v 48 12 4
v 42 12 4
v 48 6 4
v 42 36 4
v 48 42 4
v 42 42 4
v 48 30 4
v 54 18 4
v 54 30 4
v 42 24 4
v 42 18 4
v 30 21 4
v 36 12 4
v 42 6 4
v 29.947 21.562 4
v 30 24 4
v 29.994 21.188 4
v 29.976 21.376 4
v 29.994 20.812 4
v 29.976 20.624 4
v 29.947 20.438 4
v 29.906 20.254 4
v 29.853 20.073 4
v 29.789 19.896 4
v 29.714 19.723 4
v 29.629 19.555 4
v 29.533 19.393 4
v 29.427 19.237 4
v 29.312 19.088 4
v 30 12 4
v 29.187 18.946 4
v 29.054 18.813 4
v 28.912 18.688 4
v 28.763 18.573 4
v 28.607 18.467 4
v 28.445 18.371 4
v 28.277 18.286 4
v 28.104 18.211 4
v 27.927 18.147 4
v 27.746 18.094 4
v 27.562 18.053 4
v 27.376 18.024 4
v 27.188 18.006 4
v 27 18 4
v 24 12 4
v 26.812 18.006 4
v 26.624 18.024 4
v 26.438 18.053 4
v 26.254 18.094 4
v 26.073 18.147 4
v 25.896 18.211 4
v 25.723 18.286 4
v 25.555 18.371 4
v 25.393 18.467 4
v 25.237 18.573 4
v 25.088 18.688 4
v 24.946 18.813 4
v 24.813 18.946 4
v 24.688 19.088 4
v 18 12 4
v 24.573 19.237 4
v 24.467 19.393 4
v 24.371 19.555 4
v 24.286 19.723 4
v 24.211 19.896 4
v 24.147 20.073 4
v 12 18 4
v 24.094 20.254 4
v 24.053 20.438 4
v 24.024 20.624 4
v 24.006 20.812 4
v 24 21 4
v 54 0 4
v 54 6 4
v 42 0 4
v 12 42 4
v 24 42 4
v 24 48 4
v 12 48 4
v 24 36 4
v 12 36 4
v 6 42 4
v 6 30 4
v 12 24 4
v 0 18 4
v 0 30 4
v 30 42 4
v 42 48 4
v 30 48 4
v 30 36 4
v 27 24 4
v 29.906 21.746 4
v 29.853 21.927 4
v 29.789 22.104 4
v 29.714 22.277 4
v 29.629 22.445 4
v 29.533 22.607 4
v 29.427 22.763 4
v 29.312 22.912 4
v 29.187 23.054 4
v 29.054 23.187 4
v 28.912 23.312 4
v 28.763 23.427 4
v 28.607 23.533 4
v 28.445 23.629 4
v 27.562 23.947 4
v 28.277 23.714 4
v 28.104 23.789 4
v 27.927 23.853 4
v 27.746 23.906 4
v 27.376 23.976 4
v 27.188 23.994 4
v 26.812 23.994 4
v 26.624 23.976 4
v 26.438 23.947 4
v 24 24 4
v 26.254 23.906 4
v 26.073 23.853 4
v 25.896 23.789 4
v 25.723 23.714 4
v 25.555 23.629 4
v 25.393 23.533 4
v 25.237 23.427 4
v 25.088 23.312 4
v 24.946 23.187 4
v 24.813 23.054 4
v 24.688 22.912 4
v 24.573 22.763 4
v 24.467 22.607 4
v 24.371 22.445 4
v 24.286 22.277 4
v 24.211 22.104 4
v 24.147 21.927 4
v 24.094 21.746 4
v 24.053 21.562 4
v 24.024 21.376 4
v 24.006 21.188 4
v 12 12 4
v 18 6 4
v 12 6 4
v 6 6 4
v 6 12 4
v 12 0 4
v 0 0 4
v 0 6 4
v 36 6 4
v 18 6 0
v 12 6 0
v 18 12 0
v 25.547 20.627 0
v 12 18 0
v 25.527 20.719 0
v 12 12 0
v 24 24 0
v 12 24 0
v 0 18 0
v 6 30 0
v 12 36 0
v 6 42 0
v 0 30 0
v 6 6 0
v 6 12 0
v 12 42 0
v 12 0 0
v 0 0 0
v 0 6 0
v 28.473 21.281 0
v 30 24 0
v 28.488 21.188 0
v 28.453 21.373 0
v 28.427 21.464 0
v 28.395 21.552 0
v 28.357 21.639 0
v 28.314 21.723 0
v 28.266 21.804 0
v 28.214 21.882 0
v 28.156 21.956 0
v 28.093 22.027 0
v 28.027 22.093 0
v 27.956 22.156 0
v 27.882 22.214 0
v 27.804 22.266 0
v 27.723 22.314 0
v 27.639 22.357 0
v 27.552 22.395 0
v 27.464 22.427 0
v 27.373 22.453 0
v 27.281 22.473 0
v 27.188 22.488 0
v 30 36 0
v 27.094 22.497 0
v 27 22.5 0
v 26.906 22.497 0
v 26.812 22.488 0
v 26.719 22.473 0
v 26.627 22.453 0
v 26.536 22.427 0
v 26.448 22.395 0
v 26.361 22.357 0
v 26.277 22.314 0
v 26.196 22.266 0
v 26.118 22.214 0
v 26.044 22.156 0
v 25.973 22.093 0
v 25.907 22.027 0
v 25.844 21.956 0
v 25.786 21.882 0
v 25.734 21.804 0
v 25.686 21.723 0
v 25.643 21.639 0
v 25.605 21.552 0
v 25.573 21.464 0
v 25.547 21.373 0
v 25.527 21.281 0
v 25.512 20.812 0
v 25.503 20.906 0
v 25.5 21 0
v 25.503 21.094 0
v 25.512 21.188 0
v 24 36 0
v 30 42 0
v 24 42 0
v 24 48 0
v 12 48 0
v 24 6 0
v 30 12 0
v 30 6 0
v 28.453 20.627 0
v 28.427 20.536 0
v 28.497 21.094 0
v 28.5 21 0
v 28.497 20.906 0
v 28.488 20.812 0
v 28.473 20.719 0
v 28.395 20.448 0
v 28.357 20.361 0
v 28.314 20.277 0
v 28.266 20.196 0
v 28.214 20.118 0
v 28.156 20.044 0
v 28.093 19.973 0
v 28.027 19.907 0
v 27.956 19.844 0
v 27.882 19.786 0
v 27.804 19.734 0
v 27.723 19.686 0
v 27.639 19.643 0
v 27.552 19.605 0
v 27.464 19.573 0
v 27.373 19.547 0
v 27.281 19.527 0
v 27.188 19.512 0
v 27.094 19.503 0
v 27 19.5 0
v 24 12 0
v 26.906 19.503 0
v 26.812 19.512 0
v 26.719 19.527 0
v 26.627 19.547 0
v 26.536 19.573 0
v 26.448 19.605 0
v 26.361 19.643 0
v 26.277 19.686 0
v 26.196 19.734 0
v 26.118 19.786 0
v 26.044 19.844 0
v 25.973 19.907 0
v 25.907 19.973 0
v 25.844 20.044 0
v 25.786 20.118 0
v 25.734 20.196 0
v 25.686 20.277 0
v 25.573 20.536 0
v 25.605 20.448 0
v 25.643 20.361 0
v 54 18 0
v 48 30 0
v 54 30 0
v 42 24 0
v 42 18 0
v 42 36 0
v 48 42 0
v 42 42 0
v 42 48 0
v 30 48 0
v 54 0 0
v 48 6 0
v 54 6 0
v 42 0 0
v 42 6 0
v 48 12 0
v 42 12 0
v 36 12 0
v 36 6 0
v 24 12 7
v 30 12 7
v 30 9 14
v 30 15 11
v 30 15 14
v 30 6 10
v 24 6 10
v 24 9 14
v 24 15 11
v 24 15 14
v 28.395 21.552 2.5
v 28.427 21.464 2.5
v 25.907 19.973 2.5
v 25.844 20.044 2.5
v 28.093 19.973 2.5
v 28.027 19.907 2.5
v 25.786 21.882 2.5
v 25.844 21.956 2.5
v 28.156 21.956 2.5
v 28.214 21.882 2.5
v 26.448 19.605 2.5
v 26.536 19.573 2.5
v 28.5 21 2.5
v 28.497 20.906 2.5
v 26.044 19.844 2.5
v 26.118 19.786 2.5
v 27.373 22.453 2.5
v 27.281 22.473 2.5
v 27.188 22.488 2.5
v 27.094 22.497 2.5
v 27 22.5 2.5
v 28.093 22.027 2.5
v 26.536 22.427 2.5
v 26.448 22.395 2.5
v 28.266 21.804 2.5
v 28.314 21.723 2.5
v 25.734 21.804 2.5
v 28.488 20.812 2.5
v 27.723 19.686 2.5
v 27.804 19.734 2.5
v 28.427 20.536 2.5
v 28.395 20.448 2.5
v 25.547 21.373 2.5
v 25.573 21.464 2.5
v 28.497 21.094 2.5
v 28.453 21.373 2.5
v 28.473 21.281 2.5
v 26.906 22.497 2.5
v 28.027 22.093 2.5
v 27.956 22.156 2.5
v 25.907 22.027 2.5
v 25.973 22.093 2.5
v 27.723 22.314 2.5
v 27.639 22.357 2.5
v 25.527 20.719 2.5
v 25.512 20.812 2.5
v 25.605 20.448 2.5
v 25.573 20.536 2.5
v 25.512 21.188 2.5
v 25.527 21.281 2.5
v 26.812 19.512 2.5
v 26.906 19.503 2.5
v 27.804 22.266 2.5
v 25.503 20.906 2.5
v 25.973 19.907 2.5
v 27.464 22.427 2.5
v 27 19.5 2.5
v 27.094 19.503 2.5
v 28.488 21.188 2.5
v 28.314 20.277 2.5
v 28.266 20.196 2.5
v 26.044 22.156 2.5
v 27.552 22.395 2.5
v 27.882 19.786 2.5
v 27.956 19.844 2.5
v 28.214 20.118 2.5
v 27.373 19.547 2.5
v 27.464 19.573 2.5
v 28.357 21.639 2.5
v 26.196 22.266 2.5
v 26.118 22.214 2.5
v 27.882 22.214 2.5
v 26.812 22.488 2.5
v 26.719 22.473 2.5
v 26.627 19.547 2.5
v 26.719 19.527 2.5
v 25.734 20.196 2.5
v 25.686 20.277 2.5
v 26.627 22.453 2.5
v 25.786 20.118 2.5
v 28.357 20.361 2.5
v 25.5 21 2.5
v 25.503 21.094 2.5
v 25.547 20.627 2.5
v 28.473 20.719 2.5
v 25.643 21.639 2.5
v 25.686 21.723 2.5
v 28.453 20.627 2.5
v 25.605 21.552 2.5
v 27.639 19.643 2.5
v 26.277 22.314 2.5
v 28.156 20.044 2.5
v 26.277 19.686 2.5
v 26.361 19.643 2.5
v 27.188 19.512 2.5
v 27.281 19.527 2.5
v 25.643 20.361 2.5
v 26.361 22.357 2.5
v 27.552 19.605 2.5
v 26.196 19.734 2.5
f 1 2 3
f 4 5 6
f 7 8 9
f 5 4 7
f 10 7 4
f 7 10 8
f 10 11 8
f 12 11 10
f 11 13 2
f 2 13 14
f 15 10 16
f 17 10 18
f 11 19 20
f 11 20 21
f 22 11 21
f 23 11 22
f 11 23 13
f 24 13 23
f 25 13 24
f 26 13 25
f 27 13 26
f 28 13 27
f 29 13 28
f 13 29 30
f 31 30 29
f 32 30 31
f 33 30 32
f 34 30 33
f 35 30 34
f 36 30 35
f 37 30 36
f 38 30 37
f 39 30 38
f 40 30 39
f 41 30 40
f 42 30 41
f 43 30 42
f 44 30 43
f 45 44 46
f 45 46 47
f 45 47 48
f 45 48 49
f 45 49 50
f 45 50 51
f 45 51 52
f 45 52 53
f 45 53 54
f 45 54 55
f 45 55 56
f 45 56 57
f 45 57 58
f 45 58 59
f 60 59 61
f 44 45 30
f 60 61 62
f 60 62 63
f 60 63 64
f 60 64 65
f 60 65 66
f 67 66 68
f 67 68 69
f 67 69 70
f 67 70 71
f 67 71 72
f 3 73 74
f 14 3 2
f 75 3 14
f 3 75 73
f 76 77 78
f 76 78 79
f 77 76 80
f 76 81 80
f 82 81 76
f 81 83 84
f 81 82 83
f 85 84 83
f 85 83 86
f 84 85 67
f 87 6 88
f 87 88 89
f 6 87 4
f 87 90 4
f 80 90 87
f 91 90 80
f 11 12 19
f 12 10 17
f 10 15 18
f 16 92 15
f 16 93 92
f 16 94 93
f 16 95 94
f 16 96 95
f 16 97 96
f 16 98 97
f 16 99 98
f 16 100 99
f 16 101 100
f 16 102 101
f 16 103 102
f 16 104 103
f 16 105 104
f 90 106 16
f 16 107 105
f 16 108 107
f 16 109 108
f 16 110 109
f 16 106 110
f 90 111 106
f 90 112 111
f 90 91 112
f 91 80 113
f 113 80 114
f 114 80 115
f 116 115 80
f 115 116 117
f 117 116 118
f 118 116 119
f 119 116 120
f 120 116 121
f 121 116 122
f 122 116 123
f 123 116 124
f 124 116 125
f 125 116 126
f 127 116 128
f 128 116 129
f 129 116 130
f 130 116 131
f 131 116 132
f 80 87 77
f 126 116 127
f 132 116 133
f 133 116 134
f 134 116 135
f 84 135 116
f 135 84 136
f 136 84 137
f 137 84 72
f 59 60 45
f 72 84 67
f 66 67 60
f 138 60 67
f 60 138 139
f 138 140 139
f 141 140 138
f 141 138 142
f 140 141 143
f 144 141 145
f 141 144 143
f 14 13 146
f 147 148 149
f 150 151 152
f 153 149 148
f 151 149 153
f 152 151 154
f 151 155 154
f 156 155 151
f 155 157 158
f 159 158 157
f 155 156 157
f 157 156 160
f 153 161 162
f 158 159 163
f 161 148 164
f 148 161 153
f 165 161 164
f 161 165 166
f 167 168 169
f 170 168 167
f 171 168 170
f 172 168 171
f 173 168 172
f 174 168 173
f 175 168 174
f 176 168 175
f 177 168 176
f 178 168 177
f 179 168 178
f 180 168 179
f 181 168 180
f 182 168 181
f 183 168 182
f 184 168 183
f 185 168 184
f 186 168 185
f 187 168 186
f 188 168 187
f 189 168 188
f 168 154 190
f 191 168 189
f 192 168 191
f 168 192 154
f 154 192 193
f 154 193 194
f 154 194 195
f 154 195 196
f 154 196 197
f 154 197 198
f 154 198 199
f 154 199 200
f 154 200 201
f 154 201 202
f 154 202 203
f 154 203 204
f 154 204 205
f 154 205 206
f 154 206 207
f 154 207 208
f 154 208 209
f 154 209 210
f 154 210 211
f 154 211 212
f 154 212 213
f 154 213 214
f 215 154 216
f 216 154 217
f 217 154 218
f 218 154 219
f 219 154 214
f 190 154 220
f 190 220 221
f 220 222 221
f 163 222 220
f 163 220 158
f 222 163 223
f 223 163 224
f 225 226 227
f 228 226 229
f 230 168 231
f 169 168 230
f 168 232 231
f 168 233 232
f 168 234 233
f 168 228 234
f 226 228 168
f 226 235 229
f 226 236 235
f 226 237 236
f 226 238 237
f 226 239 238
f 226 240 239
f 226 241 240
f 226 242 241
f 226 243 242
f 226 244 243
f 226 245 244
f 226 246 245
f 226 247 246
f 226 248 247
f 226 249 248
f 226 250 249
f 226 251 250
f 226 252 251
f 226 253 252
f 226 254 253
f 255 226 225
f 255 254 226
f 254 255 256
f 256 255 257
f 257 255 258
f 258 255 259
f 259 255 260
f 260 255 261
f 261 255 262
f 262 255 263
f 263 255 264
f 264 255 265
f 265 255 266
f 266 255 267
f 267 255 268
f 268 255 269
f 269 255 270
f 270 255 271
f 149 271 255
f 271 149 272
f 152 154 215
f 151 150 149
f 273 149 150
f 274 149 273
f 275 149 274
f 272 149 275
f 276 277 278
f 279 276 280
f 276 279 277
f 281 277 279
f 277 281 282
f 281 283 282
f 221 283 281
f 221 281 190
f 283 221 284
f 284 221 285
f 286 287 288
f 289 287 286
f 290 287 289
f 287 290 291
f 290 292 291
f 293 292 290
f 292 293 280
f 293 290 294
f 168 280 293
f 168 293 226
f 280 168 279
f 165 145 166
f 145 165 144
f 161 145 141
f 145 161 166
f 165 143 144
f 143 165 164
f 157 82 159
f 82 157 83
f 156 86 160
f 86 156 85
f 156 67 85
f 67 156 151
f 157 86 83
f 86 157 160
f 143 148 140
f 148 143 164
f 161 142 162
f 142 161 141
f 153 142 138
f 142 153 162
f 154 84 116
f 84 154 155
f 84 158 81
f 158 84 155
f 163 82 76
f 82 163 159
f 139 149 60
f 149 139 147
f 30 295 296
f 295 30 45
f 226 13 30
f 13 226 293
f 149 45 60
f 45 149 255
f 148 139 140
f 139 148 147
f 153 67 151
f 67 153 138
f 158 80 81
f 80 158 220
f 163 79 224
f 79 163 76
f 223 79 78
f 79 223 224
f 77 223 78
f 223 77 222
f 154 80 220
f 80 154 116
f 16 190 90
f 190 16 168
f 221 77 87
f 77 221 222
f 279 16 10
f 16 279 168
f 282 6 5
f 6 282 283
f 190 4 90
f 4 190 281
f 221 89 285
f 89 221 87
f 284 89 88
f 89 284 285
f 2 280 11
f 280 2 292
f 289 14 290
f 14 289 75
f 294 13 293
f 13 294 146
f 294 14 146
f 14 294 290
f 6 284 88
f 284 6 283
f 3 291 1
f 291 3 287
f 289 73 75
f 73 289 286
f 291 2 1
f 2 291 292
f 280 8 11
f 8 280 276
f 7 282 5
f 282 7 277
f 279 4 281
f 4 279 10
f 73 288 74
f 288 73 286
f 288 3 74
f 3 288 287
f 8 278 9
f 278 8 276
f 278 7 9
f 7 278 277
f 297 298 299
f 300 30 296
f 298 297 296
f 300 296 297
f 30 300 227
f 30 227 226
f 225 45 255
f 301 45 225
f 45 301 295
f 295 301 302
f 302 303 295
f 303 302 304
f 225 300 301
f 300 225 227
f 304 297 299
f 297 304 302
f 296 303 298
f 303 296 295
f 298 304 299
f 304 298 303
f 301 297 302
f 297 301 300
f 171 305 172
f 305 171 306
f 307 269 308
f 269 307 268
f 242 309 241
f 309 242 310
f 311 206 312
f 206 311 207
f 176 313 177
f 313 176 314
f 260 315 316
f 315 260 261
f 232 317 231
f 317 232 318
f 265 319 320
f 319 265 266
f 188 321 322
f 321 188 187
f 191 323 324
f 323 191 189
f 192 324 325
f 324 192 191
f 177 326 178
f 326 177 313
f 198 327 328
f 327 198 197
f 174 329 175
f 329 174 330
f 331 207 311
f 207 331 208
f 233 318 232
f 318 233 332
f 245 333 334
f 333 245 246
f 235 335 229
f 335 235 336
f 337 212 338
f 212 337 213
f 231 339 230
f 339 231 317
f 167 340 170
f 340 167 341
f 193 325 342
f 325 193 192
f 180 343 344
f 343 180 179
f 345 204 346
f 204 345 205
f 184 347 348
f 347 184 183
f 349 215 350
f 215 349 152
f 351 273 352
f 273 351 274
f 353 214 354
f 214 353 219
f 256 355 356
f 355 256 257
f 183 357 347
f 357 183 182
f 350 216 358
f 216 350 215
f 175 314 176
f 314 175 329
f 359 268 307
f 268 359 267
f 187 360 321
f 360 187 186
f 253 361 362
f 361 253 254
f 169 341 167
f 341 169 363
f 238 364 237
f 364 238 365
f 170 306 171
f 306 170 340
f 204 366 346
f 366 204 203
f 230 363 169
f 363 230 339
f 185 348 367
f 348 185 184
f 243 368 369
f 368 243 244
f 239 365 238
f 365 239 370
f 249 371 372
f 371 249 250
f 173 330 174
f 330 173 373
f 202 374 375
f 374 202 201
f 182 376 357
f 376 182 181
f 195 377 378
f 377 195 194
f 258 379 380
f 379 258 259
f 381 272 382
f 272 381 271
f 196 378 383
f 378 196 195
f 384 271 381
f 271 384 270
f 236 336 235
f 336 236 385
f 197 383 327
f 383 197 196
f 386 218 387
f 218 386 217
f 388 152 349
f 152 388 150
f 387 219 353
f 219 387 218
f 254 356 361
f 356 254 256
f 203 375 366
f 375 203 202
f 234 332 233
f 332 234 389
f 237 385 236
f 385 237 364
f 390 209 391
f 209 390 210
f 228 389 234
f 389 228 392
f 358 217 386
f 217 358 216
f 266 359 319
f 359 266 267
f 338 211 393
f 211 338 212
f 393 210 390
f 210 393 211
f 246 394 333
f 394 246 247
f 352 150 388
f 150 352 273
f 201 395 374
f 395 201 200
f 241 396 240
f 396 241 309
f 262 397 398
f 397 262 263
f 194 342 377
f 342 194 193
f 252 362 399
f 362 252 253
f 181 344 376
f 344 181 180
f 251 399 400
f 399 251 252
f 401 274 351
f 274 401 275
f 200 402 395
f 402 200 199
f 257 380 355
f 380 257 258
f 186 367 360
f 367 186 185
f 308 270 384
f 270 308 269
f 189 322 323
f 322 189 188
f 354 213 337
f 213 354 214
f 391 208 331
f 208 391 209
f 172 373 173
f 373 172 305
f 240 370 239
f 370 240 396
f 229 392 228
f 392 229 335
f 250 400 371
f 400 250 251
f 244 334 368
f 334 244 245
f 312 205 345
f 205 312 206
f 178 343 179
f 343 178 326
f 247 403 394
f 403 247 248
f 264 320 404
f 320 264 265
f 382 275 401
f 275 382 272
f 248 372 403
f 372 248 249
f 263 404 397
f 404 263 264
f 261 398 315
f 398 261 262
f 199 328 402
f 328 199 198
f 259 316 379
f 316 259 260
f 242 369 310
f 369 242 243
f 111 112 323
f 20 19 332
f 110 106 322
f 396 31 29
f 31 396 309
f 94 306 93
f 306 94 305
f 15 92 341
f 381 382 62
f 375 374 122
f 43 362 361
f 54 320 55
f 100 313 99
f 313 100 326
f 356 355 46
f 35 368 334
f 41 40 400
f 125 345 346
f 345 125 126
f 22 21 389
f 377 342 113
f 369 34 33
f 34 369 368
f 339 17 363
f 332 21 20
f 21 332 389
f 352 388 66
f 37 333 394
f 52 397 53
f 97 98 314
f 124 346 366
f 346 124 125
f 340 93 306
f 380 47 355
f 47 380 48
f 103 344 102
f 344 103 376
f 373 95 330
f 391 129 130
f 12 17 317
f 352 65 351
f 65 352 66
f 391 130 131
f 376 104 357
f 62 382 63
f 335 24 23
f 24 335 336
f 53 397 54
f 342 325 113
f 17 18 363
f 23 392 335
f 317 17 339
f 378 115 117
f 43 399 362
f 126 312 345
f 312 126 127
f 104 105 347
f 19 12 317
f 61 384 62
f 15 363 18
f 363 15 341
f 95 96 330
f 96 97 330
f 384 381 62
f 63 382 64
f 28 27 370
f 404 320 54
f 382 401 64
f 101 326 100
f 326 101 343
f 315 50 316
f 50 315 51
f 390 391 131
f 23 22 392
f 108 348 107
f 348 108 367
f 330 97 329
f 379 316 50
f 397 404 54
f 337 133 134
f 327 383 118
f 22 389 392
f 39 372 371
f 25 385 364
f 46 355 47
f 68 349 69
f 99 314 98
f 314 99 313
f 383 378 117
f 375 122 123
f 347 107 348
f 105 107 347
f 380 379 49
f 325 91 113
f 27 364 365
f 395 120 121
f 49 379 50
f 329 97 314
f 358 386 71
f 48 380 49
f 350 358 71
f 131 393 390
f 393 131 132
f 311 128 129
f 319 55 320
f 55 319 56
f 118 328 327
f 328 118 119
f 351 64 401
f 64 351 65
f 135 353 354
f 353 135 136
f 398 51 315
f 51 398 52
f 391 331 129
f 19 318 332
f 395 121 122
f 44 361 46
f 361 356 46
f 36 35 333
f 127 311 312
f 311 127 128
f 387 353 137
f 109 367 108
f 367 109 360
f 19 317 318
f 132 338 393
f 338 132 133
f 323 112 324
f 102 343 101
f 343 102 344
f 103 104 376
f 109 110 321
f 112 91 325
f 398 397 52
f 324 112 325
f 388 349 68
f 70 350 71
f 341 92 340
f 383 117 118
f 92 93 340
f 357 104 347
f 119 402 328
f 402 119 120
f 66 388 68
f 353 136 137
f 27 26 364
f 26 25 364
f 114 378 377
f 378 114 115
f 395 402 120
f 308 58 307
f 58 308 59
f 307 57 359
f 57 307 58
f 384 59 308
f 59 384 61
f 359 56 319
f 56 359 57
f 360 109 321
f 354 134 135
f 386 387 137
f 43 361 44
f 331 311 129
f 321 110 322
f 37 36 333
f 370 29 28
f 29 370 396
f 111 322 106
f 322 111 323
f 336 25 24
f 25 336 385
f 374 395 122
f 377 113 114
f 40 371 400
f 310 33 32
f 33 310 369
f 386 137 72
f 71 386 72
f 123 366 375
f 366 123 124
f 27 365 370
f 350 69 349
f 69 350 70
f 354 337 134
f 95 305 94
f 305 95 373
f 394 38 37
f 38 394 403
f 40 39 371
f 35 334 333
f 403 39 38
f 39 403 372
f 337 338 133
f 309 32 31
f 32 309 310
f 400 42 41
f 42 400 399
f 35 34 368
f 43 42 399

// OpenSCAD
/* ********************************************************************
 * Space Invader Hooks
 * 
 * Generate your own cloth hooks. Tweak parameters, create your own
 * hooks or use the predefined modules.
 *
 * ******************************************************************** */


// ------------------------------------------------------------------
// --- parameter ----------------------------------------------------
// ------------------------------------------------------------------

// resolution
$fn=100;

// edge length of one cube that builds the space invader
edgeLength=6;
strength=4;

// radius of the holes
wholeRadius=1.5;


// ------------------------------------------------------------------
// --- space invader versions ---------------------------------------
// --- a vector of 2d coordinates -----------------------------------
// ------------------------------------------------------------------

sp1=[[0,0],[0,1],[0,2],[1,2],[1,3],[1,4],[2,1],[2,2],[2,4],[2,5],[3,2],[3,3],[3,4],[4,1],[4,2],[4,4],[4,5],[5,2],[5,3],[5,4],[6,0],[6,1],[6,2]];

sp2=[[0,0],[0,1],[0,2],[1,2],[1,3],[1,4],[2,1],[2,2],[2,4],[2,5],[3,-1],[3,0],[3,1],[3,2],[3,3],[3,4],[4,1],[4,2],[4,4],[4,5],[5,2],[5,3],[5,4],[6,0],[6,1],[6,2]];

sp3=[[0,-1],[0,0],[0,1],[0,2],[1,-1],[1,2],[1,3],[1,4],[2,1],[2,2],[2,4],[2,5],[3,-1],[3,0],[3,1],[3,2],[3,3],[3,4],[4,1],[4,2],[4,4],[4,5],[5,-1],[5,2],[5,3],[5,4],[6,-1],[6,0],[6,1],[6,2]];

sp4=[[0,0],[0,3],[0,4],[1,0],[1,1],[1,3],[1,4],[1,5],[1,6],[2,1],[2,2],[2,3],[2,6],[2,7],[3,2],[3,3],[3,6],[3,7],[4,2],[4,3],[4,4],[4,5],[4,6],[5,2],[5,3],[5,6],[5,7],[6,1],[6,2],[6,3],[6,6],[6,7],[7,0],[7,1],[7,3],[7,4],[7,5],[7,6],[8,0],[8,3],[8,4]];


// ------------------------------------------------------------------
// --- programm -----------------------------------------------------
// ------------------------------------------------------------------

invader4();


// ------------------------------------------------------------------
// --- invader modules ----------------------------------------------
// ------------------------------------------------------------------


module invader1() {
	_invader(sp1, [3,2], [3,4]);
}

module invader2() {
	_invader(sp2, [3,-1], [3,2]);
}

module invader3() {
	_invader(sp3, [3,-1], [3,2]);
}

module invader4() {
	_invader(sp4, [4,1], [4,3]);
}




// ------------------------------------------------------------------
// --- modules ------------------------------------------------------
// ------------------------------------------------------------------


// builds a complete towel hook with space invader base, 
// holes and noses.
//
module _invader(data, nose, hole) {
	difference() {
		union() {
			for (i = [0:len(data)]) {
				_cube(data[i][0], data[i][1], 0);
			}
			_hook(nose[0], nose[1]);
		}
		translate([hole[0]*edgeLength+edgeLength/2, hole[1]*edgeLength+edgeLength/2, 0]) {
			cylinder(h=edgeLength, r=1.5);
			hull() {
				translate([0, 0, strength-1.5]) cylinder(h=0.1, r=1.5);
				translate([0, 0, strength]) cylinder(h=0.1, r=3);
			}
		}
	}
}

// builds a cube at specified position
//
module _cube(x, y) {
	translate([x*edgeLength, y*edgeLength, 0]) {
		cube([edgeLength, edgeLength, strength]);
	}
}

// builds the hook at specified position
//
module _hook(x, y) {
	translate([x*edgeLength, y*edgeLength, 0]) {
		union() {
			cube([edgeLength, edgeLength, 0.5*edgeLength+strength]);
			hull() {
				translate([0, 0, 0.5*edgeLength+strength]) {
					cube([edgeLength, edgeLength, 0.5*edgeLength]);
				}
				translate([0, 0.5*edgeLength, 0.5*edgeLength+2*strength]) {
					cube([edgeLength, edgeLength, 0.5*edgeLength]);
				}
			}
		}
	}
}
